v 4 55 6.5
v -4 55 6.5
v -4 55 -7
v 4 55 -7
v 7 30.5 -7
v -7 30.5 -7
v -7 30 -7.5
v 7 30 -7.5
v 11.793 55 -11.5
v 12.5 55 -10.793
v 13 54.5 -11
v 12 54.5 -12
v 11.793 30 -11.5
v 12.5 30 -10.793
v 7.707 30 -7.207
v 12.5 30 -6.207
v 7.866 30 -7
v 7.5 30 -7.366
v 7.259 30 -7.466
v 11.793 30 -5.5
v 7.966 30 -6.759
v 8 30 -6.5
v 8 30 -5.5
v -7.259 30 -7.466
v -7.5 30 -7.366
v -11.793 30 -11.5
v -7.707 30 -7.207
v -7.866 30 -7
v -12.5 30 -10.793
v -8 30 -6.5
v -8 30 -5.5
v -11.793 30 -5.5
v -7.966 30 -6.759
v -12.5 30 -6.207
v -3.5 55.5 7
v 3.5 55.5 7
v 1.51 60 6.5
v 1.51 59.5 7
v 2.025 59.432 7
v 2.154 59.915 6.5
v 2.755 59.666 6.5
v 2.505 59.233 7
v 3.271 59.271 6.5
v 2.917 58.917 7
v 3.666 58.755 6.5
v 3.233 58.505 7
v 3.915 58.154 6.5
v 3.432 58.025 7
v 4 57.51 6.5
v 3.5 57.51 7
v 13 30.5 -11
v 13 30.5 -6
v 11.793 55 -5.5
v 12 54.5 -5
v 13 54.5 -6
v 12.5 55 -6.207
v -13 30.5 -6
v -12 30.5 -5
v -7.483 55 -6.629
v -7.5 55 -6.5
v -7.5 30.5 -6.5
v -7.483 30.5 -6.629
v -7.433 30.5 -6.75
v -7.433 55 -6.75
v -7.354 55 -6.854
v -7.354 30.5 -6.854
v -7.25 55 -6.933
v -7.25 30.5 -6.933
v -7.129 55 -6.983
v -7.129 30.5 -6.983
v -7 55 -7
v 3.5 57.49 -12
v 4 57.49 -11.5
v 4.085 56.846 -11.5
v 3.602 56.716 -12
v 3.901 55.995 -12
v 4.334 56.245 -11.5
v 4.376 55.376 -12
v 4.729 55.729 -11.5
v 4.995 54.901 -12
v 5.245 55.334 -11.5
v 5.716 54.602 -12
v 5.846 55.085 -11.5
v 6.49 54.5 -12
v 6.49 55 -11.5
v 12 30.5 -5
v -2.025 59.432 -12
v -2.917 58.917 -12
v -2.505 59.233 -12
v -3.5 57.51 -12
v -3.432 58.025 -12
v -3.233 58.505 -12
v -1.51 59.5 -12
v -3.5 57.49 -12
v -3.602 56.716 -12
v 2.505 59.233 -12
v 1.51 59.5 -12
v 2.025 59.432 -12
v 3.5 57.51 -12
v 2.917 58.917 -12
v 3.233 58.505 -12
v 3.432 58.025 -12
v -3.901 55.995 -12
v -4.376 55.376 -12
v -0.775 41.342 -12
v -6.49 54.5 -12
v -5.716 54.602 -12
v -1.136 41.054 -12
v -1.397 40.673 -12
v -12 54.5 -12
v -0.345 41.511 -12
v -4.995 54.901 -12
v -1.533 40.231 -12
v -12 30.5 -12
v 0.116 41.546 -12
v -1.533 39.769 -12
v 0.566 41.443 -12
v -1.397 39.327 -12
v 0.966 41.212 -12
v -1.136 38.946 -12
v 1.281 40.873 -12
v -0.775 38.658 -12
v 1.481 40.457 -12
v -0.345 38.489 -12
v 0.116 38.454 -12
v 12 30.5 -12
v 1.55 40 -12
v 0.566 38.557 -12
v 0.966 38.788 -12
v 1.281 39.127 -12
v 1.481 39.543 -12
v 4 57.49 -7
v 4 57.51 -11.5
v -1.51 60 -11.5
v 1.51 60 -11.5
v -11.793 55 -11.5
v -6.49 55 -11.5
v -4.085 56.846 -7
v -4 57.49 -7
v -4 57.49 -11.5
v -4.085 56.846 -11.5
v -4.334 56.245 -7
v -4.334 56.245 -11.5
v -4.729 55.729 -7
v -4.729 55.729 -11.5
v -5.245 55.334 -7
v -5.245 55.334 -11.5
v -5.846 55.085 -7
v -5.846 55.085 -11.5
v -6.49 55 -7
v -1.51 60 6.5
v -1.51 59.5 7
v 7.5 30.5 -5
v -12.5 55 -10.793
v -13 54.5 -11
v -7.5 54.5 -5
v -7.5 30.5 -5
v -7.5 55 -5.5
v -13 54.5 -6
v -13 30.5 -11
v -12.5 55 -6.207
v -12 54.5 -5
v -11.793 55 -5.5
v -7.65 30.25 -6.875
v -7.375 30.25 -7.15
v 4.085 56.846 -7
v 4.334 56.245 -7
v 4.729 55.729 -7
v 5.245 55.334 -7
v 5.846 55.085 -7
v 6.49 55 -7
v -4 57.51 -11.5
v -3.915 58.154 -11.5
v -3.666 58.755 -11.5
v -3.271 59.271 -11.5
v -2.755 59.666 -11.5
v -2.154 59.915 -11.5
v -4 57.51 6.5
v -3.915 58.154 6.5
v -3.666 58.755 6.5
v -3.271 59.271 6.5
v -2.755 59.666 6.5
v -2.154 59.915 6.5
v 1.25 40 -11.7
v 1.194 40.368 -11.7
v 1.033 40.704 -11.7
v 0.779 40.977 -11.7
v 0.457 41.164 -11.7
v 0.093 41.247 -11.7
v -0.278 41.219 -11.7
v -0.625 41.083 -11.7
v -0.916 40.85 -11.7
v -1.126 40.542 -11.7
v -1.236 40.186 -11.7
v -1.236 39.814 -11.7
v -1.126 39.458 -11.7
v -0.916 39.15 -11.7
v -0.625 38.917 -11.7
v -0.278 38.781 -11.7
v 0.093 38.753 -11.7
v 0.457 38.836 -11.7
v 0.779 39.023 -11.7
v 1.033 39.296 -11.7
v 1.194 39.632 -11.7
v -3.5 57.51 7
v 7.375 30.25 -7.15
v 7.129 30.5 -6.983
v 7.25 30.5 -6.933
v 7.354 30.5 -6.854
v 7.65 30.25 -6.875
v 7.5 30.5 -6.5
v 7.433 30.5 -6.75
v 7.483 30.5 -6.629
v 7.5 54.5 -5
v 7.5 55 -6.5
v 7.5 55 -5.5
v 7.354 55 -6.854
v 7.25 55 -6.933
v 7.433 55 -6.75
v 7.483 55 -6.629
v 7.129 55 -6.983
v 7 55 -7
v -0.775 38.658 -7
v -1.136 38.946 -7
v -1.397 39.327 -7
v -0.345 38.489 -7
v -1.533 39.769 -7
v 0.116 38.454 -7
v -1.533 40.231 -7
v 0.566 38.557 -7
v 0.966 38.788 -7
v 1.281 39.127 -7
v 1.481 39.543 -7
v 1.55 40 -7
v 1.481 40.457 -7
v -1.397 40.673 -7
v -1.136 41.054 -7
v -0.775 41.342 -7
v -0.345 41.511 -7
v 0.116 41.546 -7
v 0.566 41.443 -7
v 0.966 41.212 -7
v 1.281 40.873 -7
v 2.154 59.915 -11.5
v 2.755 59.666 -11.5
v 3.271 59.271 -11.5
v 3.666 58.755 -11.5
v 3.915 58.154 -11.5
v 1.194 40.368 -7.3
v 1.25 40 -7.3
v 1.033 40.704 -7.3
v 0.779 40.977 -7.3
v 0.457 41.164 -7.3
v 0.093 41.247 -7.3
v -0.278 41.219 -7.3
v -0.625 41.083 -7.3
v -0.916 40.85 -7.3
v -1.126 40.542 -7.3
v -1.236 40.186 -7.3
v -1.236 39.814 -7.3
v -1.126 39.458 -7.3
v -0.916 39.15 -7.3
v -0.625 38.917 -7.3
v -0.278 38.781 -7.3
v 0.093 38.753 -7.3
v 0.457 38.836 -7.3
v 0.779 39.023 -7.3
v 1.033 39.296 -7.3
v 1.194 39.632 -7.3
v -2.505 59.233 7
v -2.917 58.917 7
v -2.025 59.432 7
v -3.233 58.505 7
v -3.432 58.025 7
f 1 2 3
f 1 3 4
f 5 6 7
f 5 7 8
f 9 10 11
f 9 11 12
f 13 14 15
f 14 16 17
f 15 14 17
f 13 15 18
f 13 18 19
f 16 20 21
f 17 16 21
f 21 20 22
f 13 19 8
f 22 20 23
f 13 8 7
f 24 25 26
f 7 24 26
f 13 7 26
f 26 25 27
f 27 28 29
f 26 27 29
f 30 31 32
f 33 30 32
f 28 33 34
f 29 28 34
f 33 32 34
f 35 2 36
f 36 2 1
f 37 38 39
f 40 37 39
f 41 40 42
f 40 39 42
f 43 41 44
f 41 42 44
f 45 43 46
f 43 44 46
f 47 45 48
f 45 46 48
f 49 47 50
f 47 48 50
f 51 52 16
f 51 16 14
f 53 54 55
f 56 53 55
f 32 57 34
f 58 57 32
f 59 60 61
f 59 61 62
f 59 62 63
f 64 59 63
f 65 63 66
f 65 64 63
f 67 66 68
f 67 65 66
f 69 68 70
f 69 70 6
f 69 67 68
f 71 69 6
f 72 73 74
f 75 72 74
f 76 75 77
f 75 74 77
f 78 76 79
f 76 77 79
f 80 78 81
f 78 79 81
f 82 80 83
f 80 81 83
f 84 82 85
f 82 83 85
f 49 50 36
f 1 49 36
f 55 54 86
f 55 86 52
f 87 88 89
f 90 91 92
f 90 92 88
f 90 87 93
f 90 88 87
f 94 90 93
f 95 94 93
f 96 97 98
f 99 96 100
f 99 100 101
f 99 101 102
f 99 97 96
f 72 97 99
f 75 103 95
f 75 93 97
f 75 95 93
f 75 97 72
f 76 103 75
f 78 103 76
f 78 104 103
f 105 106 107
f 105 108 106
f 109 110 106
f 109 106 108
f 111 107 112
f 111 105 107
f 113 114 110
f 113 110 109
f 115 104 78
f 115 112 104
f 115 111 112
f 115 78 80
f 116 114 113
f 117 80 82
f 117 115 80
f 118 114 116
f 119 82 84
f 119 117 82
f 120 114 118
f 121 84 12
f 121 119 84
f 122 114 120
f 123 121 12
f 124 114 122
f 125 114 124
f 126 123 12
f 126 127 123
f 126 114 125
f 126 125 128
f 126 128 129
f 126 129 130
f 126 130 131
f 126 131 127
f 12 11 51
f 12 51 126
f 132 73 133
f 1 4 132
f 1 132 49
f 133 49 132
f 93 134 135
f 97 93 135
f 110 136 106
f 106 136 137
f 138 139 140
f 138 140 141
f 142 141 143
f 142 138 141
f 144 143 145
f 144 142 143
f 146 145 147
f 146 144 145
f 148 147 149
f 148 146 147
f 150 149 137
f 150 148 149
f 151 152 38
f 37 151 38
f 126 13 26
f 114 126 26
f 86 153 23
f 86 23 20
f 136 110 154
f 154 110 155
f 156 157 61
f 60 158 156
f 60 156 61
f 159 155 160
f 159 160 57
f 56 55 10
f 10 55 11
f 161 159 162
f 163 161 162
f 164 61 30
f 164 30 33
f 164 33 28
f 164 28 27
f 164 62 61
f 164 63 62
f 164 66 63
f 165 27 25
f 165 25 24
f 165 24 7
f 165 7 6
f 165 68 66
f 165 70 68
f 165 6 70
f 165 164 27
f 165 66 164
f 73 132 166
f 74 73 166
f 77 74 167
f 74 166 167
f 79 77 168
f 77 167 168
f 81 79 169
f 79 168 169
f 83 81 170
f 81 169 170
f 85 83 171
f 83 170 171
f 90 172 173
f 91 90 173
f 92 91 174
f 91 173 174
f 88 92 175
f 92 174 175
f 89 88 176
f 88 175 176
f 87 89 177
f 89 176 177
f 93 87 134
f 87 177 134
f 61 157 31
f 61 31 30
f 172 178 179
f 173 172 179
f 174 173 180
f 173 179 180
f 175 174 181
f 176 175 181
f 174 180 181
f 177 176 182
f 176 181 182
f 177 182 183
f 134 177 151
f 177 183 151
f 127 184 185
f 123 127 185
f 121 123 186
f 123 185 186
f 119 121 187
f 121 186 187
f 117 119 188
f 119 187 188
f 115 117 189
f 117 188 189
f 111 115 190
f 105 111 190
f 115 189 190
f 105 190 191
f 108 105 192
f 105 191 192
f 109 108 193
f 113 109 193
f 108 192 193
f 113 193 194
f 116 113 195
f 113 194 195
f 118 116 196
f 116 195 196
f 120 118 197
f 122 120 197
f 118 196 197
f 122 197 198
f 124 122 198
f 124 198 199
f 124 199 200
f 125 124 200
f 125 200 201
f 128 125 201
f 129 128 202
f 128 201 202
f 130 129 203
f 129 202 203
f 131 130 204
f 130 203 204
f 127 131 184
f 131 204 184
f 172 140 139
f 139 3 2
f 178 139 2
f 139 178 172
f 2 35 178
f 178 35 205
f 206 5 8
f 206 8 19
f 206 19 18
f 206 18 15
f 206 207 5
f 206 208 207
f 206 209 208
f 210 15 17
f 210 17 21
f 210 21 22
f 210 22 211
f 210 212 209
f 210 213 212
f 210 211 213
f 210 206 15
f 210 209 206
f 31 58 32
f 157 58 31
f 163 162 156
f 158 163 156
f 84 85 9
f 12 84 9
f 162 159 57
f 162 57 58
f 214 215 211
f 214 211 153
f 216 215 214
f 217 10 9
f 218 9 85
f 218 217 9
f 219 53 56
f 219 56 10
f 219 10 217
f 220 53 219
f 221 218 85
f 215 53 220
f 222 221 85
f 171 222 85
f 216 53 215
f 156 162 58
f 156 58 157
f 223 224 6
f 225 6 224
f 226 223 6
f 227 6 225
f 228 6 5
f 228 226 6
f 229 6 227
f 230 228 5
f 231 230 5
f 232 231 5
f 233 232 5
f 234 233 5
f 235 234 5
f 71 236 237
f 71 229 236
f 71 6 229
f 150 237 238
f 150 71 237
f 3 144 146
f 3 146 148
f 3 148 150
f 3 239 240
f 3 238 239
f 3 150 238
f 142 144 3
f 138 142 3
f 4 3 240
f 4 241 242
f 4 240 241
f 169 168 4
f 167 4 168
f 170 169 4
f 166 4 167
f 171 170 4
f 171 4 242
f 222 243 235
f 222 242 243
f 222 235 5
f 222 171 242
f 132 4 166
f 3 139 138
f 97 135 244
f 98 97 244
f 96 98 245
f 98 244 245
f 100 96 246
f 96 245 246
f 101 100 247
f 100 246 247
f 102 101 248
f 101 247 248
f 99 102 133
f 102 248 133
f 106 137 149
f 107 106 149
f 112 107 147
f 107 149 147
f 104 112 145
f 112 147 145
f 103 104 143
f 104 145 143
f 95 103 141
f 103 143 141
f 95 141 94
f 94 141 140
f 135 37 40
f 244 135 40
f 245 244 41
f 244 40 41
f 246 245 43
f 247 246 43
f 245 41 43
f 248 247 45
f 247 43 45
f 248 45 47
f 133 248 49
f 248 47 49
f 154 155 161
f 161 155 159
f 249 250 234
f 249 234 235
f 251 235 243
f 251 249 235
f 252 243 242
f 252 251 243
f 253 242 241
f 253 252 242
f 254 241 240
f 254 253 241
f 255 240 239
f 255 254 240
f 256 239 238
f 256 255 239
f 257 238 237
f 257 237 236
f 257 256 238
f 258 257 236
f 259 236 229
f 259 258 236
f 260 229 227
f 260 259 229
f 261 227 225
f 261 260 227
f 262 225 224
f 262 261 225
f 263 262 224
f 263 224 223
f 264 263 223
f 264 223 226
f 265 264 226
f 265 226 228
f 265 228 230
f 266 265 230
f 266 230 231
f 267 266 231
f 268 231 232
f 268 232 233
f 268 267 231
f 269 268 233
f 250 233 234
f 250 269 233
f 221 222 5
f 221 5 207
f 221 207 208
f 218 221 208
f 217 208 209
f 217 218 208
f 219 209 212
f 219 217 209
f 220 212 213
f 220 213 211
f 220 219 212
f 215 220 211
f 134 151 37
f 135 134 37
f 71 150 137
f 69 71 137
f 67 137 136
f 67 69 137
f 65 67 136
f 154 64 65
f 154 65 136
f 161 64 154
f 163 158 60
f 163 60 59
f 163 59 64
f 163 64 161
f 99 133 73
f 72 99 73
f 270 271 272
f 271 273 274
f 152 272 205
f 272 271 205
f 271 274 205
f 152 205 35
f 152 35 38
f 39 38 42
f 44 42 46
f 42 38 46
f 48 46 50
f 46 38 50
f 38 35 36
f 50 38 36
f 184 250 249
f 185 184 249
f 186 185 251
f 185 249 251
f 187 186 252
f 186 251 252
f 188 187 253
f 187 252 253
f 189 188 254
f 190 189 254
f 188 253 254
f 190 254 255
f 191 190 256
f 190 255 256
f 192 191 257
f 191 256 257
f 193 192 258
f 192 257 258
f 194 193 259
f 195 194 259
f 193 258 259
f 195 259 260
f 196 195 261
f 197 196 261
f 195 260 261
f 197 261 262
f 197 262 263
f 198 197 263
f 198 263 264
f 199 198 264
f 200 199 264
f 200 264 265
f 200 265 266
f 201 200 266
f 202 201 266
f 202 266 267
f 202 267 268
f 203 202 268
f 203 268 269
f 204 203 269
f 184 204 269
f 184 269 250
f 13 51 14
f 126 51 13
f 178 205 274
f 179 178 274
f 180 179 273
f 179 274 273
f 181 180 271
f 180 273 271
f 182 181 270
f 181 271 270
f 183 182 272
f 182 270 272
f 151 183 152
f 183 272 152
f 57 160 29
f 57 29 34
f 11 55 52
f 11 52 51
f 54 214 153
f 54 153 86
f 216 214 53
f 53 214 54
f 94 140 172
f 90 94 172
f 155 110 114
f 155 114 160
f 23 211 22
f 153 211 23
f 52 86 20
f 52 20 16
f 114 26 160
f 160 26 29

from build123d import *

# Parameters (mm, degrees)
PAD004_DEPTH    = 25
SKETCH032_W     = 8
SKETCH032_H     = 19
PAD005_DEPTH    = 5
SKETCH033_R     = 1.25
POCKET006_DEPTH = 12.001
FILLET_R        = 2.49
CHAMFER009_SIZE = 0.3
CHAMFER010_SIZE = 0.5


with BuildPart() as part:
    # Sketch031 → Pad004 (new body)
    with BuildSketch(Plane.XZ):
        with BuildLine():
            Line((-7.5, -5), (-7.5, -6.5))
            ThreePointArc((-7.5, -6.5), (-7.353553, -6.853553), (-7, -7))
            Line((-7, -7), (7, -7))
            ThreePointArc((7, -7), (7.353553, -6.853553), (7.5, -6.5))
            Line((7.5, -6.5), (7.5, -5))
            Line((7.5, -5), (12, -5))
            Line((12, -5), (13, -6))
            Line((13, -6), (13, -11))
            Line((13, -11), (12, -12))
            Line((12, -12), (-12, -12))
            Line((-12, -12), (-13, -11))
            Line((-13, -11), (-13, -6))
            Line((-13, -6), (-12, -5))
            Line((-12, -5), (-7.5, -5))
        make_face()
    extrude(amount=PAD004_DEPTH)

    # Sketch032 → Pad005 (join)
    with BuildSketch(Plane.XZ):
        with Locations((0, -2.5)):
            Rectangle(SKETCH032_W, SKETCH032_H)
    extrude(amount=-PAD005_DEPTH)

    # Sketch033 → Pocket006 (cut, through all)
    with BuildSketch(Plane.XY):
        with Locations((0, -15)):
            Circle(SKETCH033_R)
    extrude(amount=-POCKET006_DEPTH, mode=Mode.SUBTRACT)

    # Fillet
    fillet_edges = [part.edges().sort_by_distance(p)[0] for p in [
        (4, 0, -9.5),
        (-4, 0, -9.5),
        (-4, 5, -2.5),
        (4, 5, -2.5),
    ]]
    fillet(fillet_edges, radius=FILLET_R)

    # Chamfer009
    chamfer009_edges = [part.edges().sort_by_distance(p)[0] for p in [
        (-1.25, -15, -7),
        (-1.25, -15, -12),
    ]]
    chamfer(chamfer009_edges, length=CHAMFER009_SIZE)

    # Chamfer010
    chamfer010_edges = [part.edges().sort_by_distance(p)[0] for p in [
        (-7.5, -25, -5.75),
        (-7.353553, -25, -6.853553),
        (0, -25, -7),
        (7.353553, -25, -6.853553),
        (7.5, -25, -5.75),
        (9.75, -25, -5),
        (12.5, -25, -5.5),
        (13, -25, -8.5),
        (12.5, -25, -11.5),
        (0, -25, -12),
        (-12.5, -25, -11.5),
        (-13, -25, -8.5),
        (-12.5, -25, -5.5),
        (-9.75, -25, -5),
        (-4, 1.255, 7),
        (-3.270696, 4.270696, 7),
        (0, 0, 7),
        (0, 5, 7),
        (4, 1.255, 7),
        (3.270696, 4.270696, 7),
        (13, 0, -8.5),
        (12.5, 0, -5.5),
        (12.5, 0, -11.5),
        (9.75, 0, -5),
        (-9.75, 0, -5),
        (-12.5, 0, -5.5),
        (-13, 0, -8.5),
        (-12.5, 0, -11.5),
        (0, 5, -12),
    ]]
    chamfer(chamfer010_edges, length=CHAMFER010_SIZE)


with BuildPart() as part_1:
    # Body007 placement: moved
    add(part.part.moved(Location((0, 55, 0))))


solid = part_1.part
